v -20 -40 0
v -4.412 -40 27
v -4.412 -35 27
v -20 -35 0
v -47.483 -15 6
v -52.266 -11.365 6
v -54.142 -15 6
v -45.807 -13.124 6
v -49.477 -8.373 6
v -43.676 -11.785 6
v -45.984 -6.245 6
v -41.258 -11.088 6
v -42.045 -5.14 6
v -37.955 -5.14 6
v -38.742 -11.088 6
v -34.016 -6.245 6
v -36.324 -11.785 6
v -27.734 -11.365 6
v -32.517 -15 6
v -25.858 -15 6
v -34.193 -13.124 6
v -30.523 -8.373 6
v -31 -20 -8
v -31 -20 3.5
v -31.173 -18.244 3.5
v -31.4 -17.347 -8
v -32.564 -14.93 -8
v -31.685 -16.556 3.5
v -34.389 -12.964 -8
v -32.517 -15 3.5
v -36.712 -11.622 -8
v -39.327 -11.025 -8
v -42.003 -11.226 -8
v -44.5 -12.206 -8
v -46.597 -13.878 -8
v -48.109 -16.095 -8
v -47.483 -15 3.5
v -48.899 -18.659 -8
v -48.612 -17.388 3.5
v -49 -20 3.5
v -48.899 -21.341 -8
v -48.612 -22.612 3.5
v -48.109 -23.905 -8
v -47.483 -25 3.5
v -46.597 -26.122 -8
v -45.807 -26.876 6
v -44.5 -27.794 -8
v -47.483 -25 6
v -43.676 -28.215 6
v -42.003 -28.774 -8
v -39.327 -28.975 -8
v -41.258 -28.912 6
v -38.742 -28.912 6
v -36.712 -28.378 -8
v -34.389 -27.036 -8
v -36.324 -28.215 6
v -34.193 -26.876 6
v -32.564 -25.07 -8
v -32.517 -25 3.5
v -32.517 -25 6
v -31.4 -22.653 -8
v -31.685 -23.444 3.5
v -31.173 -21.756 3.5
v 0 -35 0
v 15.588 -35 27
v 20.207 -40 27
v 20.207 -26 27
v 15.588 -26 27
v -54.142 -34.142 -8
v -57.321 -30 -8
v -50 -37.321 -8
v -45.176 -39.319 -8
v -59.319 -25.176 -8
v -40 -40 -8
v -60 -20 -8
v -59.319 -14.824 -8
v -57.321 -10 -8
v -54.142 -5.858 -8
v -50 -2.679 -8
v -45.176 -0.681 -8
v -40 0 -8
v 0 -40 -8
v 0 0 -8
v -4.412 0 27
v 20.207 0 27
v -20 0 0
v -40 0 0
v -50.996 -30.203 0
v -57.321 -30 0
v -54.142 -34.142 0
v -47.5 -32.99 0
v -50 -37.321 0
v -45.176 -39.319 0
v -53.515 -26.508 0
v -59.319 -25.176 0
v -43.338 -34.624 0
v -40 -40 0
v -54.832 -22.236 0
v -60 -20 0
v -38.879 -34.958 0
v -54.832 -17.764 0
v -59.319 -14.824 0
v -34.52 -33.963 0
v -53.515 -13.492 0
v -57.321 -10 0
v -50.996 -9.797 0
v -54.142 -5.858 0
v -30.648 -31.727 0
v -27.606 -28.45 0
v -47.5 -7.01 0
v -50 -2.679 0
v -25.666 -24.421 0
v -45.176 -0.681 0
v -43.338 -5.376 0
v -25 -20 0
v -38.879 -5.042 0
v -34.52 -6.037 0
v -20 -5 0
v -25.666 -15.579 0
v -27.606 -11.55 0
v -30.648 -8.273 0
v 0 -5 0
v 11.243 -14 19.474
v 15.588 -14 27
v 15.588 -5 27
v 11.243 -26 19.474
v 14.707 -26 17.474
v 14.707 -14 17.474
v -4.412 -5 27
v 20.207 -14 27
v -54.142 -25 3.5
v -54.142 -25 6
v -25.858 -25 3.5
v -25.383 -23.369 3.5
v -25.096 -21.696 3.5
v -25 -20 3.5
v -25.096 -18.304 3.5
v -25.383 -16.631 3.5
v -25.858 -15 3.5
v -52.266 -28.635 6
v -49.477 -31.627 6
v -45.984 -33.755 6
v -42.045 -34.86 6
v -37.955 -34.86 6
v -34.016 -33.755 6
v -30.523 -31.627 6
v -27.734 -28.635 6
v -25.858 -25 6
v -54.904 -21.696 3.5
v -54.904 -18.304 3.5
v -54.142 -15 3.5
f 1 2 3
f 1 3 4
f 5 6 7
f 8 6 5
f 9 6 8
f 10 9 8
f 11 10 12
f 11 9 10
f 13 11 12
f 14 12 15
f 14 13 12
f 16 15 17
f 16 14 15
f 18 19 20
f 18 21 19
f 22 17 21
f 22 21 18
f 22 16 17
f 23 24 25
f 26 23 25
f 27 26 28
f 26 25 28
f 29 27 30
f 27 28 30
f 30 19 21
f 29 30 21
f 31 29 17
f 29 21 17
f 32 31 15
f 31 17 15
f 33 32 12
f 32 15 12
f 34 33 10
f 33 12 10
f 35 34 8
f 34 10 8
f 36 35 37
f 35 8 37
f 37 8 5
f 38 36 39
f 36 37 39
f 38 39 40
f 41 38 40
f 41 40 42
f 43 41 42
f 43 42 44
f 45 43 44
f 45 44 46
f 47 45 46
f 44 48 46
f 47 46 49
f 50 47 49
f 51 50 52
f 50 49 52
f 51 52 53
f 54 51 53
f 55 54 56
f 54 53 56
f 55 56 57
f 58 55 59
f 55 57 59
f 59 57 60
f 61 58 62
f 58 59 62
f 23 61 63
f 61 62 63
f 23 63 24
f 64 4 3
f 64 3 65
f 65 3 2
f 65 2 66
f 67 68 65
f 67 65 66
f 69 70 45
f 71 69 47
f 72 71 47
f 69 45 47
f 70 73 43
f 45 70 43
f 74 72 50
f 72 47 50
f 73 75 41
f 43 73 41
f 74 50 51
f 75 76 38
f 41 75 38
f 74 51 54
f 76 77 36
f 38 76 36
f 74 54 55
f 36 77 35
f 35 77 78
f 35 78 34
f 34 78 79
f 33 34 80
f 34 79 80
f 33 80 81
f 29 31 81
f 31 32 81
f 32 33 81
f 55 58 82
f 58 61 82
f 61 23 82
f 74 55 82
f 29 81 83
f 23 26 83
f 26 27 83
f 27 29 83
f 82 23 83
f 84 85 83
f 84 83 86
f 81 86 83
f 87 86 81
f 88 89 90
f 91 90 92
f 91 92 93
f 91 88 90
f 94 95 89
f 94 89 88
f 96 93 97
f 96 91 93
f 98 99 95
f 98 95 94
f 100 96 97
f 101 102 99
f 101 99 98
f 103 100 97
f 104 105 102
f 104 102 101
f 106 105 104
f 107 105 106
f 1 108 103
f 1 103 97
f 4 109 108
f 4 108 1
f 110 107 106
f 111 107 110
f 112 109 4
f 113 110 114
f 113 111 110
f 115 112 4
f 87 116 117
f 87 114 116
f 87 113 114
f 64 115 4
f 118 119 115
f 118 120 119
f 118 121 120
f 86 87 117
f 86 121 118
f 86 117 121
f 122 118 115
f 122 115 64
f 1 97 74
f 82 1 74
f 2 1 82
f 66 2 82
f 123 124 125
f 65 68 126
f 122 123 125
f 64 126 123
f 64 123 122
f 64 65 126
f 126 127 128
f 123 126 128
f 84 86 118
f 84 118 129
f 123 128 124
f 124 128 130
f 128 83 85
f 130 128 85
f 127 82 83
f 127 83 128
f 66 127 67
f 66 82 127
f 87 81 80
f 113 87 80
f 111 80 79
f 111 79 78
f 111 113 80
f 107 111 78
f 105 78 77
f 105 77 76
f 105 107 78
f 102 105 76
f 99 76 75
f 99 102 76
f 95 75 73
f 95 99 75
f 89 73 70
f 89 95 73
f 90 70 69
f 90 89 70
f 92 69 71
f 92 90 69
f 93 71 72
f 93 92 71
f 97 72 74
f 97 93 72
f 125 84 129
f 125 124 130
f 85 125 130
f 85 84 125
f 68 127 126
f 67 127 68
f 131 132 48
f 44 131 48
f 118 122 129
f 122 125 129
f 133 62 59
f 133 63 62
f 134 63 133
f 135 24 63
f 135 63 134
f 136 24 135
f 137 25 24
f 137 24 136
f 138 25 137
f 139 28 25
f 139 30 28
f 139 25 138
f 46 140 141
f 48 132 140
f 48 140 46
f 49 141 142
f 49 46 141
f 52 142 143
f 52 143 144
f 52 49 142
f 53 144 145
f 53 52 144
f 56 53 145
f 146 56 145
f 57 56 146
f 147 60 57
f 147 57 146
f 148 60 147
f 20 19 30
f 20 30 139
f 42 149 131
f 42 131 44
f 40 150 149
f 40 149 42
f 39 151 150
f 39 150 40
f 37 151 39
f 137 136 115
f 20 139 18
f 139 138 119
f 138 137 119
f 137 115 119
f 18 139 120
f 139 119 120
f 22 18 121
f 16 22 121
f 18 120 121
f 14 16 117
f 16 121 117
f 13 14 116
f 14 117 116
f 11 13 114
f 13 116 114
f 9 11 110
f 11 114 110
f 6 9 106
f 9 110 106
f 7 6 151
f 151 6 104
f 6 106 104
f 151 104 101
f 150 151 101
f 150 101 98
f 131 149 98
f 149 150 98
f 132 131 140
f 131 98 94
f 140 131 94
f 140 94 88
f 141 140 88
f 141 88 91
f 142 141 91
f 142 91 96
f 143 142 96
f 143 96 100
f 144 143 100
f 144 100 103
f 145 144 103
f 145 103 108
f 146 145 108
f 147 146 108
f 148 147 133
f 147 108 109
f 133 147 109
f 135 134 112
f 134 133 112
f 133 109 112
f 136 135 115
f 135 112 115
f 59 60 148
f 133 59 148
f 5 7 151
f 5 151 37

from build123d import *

# Parameters (mm, degrees)
F0_W      = 40
F0_H      = 8
F1_DEPTH  = 40
F3_DEPTH  = 8
F4_R      = 15
F5_DEPTH  = 6
F6_R      = 9
F7_DEPTH  = 14.001
F8_W      = 33.766868
F8_H      = 10
F9_DEPTH  = 2.5
F11_DEPTH = 40
F13_DEPTH = 5
F15_DEPTH = 5
F16_W     = 12
F16_H     = 11
F17_DEPTH = 5


with BuildPart() as f1:
    # F0 (on Front) → F1 (new body)
    with BuildSketch(Plane.XZ):
        with Locations((-20, -4)):
            Rectangle(F0_W, F0_H)
    extrude(amount=F1_DEPTH)

    # F2 (on face) → F3 (join)
    with BuildSketch(Plane.XY):
        with BuildLine():
            Line((-40, -40), (-40, 0))
            ThreePointArc((-40, 0), (-60, -20), (-40, -40))
        make_face()
    extrude(amount=-F3_DEPTH)

    # F4 (on face) → F5 (join)
    with BuildSketch(Plane.XY):
        with Locations((-40, -20)):
            Circle(F4_R)
    extrude(amount=F5_DEPTH)

    # F6 (on face) → F7 (cut, through all)
    with BuildSketch(Plane.XY.offset(6)):
        with Locations((-40, -20)):
            Circle(F6_R)
    extrude(amount=-F7_DEPTH, mode=Mode.SUBTRACT)

    # F8 (on face) → F9 (cut)
    with BuildSketch(Plane.XY.offset(6)):
        with Locations((-40, -20)):
            Rectangle(F8_W, F8_H)
    extrude(amount=-F9_DEPTH, mode=Mode.SUBTRACT)

    # F10 (on face) → F11 (join)
    with BuildSketch(Plane.XZ.offset(40)):
        Polygon((0, 0), (0, -8), (20.207259, 27), (15.588457, 27), align=None)
    extrude(amount=-F11_DEPTH)

    # F12 (on face) → F13 (join)
    with BuildSketch(Plane.XZ.offset(40)):
        Polygon((-4.411543, 27), (-20, 0), (0, 0), (15.588457, 27), align=None)
    extrude(amount=-F13_DEPTH)

    # F14 (on face) → F15 (join)
    with BuildSketch(Plane(origin=(0, 0, 0), x_dir=(-1, 0, 0), z_dir=(0, 1, 0))):
        Polygon((0, 0), (20, 0), (4.411543, 27), (-15.588457, 27), align=None)
    extrude(amount=-F15_DEPTH)

    # F16 (on face) → F17 (cut)
    with BuildSketch(Plane(origin=(3.464102, 0, -2), x_dir=(0, 1, 0), z_dir=(0.866025, 0, -0.5))):
        with Locations((-20, 27.986316)):
            Rectangle(F16_W, F16_H)
    extrude(amount=-F17_DEPTH, mode=Mode.SUBTRACT)


solid = f1.part
